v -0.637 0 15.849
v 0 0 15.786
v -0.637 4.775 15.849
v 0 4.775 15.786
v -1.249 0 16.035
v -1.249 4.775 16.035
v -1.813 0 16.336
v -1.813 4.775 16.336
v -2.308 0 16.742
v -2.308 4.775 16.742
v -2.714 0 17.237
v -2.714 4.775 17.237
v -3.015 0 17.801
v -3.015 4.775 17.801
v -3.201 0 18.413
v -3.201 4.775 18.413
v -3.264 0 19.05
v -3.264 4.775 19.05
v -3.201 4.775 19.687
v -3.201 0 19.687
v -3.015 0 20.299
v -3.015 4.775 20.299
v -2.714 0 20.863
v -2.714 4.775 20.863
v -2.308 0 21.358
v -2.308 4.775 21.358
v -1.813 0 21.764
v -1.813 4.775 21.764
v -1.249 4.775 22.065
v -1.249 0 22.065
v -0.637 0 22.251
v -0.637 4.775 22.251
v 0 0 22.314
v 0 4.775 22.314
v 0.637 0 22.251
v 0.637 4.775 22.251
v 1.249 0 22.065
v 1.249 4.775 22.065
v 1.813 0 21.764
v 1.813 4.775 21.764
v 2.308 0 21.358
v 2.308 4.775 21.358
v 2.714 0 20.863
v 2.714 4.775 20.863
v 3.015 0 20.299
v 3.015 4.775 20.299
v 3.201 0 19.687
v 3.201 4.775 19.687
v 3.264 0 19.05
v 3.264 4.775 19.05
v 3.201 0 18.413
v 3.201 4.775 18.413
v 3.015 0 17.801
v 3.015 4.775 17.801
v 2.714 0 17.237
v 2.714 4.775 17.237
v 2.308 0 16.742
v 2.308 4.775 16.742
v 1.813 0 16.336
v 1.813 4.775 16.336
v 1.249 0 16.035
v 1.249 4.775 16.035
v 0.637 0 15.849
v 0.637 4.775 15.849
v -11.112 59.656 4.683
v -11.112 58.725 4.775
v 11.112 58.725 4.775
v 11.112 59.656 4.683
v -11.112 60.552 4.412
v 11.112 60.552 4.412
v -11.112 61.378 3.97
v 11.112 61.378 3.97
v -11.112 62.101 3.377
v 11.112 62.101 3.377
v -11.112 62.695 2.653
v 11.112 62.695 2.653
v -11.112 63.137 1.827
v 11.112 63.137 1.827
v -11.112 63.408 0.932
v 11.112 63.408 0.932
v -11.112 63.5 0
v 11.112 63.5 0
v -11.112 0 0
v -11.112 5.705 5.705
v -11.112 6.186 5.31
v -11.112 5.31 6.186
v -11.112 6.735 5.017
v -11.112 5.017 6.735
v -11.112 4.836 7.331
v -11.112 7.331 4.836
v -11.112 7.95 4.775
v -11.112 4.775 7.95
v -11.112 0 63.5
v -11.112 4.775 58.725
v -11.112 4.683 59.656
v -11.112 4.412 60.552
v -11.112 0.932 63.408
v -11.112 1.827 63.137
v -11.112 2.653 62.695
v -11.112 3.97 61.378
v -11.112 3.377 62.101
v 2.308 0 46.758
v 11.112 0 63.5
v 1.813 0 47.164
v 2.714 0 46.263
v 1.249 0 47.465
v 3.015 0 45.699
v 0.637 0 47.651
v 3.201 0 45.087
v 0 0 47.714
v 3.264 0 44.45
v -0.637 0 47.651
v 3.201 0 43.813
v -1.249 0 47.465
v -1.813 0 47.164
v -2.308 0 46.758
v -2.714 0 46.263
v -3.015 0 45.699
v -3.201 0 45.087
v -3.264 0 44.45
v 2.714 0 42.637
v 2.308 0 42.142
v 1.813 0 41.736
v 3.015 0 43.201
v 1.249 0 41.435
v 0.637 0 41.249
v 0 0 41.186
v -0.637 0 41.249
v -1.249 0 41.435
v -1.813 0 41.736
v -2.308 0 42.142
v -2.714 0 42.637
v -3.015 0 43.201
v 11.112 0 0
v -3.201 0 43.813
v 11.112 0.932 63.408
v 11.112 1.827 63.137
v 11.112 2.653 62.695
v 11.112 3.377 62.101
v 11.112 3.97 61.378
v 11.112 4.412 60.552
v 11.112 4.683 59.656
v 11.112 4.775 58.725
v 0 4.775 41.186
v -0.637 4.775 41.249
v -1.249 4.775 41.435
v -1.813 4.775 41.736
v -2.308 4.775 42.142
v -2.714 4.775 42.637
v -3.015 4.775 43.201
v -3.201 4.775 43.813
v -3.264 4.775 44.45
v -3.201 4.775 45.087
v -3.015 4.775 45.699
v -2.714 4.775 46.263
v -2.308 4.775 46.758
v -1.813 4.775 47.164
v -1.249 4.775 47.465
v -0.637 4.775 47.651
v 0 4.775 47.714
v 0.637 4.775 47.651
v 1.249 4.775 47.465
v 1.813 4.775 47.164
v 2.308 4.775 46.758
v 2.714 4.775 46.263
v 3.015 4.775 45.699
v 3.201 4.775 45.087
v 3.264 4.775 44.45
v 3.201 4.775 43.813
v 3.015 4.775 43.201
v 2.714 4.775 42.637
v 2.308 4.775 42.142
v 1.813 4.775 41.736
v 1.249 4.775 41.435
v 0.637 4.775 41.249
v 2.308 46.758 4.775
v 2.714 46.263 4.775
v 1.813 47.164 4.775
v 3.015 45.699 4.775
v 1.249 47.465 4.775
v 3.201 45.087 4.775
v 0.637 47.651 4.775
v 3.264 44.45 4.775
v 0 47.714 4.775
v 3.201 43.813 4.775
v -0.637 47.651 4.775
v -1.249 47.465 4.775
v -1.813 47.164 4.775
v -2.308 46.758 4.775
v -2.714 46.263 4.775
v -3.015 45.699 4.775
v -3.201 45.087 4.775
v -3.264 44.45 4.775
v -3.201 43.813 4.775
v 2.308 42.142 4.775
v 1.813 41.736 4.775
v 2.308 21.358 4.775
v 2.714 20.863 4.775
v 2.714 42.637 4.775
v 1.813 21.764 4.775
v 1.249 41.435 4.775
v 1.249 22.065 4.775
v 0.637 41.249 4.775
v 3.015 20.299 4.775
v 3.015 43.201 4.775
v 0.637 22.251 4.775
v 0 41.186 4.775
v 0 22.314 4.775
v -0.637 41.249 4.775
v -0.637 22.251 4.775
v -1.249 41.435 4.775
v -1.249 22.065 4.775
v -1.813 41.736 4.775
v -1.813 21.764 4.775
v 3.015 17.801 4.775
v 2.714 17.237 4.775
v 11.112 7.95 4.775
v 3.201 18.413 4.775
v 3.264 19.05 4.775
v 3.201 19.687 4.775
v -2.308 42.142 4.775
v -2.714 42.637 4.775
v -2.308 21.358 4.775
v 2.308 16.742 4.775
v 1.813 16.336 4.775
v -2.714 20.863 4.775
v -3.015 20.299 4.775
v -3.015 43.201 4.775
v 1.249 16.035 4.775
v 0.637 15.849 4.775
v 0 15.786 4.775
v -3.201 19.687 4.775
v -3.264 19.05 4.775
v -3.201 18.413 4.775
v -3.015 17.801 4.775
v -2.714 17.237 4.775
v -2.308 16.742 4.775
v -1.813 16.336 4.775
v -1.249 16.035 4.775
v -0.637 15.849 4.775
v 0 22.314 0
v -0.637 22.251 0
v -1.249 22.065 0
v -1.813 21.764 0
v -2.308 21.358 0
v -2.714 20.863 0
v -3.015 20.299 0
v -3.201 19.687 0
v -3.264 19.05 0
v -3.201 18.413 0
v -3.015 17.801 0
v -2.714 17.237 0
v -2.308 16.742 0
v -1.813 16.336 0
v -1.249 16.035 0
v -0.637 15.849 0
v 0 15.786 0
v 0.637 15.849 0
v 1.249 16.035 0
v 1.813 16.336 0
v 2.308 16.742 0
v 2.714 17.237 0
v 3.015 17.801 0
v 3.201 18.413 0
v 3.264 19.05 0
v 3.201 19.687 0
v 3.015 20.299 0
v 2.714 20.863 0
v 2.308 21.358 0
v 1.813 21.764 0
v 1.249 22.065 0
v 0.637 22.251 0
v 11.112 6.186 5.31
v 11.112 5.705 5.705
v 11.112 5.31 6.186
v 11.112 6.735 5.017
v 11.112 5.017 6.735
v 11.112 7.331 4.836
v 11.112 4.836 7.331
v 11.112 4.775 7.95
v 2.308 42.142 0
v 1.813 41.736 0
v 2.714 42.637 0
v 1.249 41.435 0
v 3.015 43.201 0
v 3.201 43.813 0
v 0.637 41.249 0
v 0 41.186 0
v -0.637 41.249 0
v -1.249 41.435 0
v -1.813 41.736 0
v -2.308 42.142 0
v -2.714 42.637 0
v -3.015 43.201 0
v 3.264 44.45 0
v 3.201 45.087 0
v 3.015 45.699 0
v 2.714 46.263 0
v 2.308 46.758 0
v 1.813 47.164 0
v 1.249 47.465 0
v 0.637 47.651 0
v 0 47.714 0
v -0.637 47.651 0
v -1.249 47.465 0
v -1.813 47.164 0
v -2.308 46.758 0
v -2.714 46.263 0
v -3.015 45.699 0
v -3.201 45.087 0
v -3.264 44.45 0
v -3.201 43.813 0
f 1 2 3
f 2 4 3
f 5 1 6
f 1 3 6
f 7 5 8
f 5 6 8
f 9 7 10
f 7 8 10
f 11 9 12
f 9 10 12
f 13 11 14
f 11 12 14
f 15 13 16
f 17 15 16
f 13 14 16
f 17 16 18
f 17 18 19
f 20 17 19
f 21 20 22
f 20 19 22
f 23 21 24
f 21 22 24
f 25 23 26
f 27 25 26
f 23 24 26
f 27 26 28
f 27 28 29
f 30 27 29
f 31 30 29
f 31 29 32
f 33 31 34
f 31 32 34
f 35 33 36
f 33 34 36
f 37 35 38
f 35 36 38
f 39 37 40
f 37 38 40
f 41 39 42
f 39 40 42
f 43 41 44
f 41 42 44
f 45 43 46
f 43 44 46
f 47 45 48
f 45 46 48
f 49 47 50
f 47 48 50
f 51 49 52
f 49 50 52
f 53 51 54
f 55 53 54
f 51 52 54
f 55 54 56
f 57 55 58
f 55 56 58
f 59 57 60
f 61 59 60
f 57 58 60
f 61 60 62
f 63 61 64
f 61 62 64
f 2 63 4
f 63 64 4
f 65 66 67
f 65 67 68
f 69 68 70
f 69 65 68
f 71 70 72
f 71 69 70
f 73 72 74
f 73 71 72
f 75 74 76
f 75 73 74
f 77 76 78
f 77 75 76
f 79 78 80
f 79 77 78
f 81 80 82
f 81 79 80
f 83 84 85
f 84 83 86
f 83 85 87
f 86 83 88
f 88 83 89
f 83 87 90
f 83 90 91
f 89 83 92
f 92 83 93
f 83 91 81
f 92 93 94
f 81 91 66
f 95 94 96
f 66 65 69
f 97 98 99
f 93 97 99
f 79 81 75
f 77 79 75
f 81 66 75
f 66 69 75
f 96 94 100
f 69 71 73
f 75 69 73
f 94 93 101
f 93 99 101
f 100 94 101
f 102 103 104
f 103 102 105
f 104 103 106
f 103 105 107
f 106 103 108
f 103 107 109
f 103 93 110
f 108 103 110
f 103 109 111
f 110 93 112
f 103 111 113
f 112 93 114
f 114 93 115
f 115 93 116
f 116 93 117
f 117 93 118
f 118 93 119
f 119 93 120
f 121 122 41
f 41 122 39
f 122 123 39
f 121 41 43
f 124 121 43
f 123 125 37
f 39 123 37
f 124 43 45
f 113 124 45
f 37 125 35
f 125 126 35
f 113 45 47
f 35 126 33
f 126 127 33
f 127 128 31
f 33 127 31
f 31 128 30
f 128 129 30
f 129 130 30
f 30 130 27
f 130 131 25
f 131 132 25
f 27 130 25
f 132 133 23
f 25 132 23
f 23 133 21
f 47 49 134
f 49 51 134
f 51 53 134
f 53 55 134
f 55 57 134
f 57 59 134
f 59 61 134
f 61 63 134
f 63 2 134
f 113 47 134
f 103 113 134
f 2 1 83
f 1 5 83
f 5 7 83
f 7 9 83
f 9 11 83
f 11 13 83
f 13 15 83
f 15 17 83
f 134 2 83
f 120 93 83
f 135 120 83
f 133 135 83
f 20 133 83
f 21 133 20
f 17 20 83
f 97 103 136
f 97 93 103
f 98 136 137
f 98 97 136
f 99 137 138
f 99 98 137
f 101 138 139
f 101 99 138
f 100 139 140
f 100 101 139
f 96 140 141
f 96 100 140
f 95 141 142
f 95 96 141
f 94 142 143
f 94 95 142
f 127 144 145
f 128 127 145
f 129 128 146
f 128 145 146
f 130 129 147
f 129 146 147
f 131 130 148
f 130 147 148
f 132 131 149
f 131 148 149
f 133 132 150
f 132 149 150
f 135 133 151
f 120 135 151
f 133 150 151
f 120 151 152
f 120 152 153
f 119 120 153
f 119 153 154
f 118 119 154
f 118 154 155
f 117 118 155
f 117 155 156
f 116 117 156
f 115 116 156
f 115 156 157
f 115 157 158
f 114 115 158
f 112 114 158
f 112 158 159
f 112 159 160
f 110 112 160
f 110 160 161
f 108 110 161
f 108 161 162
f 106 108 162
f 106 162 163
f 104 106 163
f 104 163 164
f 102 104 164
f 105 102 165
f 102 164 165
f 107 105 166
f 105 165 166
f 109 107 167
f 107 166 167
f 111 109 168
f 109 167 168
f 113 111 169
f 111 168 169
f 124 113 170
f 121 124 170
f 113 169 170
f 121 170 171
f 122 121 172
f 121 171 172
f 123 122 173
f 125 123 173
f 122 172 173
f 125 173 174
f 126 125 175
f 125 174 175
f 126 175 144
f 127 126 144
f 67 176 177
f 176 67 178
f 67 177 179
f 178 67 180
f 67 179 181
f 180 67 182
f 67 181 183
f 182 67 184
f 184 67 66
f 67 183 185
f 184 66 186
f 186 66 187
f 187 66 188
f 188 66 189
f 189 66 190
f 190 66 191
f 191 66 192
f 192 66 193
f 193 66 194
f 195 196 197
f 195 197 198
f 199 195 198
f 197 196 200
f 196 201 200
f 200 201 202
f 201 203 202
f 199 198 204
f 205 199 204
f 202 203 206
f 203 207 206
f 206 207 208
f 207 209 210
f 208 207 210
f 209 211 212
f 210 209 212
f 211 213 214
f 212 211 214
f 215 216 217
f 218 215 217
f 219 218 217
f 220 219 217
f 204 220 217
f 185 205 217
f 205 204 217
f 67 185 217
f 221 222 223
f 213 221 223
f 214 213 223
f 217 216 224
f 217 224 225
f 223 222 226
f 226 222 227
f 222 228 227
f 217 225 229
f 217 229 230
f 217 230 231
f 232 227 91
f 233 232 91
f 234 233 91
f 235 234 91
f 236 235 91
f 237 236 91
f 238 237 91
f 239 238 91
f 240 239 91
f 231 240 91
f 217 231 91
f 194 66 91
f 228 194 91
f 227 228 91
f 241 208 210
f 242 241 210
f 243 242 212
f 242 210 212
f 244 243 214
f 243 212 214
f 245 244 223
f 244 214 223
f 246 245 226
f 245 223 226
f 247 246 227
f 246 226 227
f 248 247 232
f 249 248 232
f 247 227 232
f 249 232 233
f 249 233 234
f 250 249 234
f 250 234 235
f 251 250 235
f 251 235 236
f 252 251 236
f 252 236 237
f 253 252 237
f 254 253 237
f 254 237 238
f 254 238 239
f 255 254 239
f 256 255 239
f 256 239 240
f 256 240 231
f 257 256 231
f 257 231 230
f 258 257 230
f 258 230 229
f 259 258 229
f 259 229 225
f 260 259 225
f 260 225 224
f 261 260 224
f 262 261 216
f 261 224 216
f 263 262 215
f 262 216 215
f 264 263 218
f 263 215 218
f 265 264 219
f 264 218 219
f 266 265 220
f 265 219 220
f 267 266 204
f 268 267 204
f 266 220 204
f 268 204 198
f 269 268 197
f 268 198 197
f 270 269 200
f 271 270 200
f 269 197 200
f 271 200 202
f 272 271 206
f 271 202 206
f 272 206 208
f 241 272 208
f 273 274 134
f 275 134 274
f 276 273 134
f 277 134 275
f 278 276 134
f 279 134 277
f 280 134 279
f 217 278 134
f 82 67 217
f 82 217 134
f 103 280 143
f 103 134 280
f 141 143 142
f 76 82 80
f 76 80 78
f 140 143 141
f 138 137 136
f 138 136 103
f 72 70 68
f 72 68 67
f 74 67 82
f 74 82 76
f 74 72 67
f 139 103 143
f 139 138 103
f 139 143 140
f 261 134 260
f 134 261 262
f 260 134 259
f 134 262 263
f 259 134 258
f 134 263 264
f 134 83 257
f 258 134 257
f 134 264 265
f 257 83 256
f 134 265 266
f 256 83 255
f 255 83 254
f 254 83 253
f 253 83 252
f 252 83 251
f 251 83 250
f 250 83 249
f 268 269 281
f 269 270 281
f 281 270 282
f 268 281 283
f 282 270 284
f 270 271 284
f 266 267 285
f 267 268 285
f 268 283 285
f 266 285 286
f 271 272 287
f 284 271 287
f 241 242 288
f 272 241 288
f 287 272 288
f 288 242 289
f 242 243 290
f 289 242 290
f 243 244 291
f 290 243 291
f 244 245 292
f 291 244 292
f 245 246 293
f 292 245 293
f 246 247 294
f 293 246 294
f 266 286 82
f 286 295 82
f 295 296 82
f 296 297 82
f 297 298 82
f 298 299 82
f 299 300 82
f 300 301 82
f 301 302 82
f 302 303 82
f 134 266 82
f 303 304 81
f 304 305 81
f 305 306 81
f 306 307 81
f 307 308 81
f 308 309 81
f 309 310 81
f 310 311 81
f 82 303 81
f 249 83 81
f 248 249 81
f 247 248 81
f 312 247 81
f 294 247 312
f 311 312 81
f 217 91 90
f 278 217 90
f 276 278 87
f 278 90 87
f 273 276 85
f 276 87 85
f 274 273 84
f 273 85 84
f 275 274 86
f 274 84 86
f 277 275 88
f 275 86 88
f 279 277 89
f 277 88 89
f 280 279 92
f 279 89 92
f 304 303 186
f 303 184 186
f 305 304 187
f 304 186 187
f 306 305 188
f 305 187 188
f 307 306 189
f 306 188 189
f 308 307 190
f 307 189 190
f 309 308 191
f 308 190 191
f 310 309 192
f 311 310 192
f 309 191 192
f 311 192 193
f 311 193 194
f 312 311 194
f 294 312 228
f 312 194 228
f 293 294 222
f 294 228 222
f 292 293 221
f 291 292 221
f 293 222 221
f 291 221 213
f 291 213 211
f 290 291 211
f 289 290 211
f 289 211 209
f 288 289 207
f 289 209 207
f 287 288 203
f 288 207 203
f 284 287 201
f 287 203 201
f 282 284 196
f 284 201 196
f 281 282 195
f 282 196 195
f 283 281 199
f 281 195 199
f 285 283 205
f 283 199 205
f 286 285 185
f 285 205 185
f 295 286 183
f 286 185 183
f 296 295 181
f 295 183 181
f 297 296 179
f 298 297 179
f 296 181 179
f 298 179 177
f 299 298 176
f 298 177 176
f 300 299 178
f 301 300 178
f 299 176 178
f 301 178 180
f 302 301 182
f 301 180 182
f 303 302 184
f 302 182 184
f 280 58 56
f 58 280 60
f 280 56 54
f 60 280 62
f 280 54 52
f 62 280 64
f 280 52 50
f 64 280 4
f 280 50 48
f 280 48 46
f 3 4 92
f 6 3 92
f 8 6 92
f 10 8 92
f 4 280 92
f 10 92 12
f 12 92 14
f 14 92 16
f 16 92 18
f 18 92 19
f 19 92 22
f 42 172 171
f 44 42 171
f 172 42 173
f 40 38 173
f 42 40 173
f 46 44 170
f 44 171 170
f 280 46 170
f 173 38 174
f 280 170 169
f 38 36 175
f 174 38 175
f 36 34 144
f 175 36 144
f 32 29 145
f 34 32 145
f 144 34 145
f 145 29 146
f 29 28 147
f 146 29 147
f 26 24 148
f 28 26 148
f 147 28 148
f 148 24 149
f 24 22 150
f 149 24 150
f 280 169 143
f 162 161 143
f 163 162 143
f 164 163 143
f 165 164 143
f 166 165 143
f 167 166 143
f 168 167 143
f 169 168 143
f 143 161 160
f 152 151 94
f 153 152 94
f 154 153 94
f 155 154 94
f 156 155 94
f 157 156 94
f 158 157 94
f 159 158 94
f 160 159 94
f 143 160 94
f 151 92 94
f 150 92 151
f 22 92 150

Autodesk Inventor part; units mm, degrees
ref_plane "YZ Plane" through (0, 0, 0) normal (1, 0, 0) x (0, 1, 0)
ref_plane "XZ Plane" through (0, 0, 0) normal (0, 1, 0) x (-1, 0, 0)
ref_plane "XY Plane" through (0, 0, 0) normal (0, 0, 1) x (1, 0, 0)
sketch "Sketch_1" plane through (0, 0, 0) normal (1, 0, 0) x (0, 1, 0)
  line L0 (0, 63.5) -> (0, 0)
  line L1 (0, 0) -> (63.5, 0)
  arc A0 (63.5, 0) -> (58.7248, 4.7752) centre (58.7248, 0) ccw
  line L2 (58.7248, 4.7752) -> (7.9502, 4.7752)
  arc A1 (4.7752, 7.9502) -> (7.9502, 4.7752) centre (7.9502, 7.9502) ccw
  line L3 (4.7752, 7.9502) -> (4.7752, 58.7248)
  arc A2 (4.7752, 58.7248) -> (0, 63.5) centre (0, 58.7248) ccw
extrude "Extrusion1" add sketch "Sketch_1" along normal mid plane 22.225
sketch "Sketch2" plane through (11.1125, 0, 0) normal (0, 0, -1) x (-1, 0, 0)
  point P0 (11.1125, 19.05)
hole "Hole1" at (0, 19.05, 0) direction (0, 0, 1) diameter 6.5278 depth 4.7752
sketch "Sketch3" plane through (11.1125, 0, 0) normal (0, 0, -1) x (-1, 0, 0)
  point P0 (11.1125, 44.45)
hole "Hole2" at (0, 44.45, 0) direction (0, 0, 1) diameter 6.5278 depth 4.7752
sketch "Sketch4" plane through (-11.1125, 0, 63.5) normal (0, -1, 0) x (1, 0, 0)
  point P0 (11.1125, -44.45)
hole "Hole3" at (0, 0, 19.05) direction (0, 1, 0) diameter 6.5278 depth 4.7752
sketch "Sketch5" plane through (-11.1125, 0, 63.5) normal (0, -1, 0) x (1, 0, 0)
  point P0 (11.1125, -19.05)
hole "Hole4" at (0, 0, 44.45) direction (0, 1, 0) diameter 6.5278 depth 4.7752
properties part number "4101"
